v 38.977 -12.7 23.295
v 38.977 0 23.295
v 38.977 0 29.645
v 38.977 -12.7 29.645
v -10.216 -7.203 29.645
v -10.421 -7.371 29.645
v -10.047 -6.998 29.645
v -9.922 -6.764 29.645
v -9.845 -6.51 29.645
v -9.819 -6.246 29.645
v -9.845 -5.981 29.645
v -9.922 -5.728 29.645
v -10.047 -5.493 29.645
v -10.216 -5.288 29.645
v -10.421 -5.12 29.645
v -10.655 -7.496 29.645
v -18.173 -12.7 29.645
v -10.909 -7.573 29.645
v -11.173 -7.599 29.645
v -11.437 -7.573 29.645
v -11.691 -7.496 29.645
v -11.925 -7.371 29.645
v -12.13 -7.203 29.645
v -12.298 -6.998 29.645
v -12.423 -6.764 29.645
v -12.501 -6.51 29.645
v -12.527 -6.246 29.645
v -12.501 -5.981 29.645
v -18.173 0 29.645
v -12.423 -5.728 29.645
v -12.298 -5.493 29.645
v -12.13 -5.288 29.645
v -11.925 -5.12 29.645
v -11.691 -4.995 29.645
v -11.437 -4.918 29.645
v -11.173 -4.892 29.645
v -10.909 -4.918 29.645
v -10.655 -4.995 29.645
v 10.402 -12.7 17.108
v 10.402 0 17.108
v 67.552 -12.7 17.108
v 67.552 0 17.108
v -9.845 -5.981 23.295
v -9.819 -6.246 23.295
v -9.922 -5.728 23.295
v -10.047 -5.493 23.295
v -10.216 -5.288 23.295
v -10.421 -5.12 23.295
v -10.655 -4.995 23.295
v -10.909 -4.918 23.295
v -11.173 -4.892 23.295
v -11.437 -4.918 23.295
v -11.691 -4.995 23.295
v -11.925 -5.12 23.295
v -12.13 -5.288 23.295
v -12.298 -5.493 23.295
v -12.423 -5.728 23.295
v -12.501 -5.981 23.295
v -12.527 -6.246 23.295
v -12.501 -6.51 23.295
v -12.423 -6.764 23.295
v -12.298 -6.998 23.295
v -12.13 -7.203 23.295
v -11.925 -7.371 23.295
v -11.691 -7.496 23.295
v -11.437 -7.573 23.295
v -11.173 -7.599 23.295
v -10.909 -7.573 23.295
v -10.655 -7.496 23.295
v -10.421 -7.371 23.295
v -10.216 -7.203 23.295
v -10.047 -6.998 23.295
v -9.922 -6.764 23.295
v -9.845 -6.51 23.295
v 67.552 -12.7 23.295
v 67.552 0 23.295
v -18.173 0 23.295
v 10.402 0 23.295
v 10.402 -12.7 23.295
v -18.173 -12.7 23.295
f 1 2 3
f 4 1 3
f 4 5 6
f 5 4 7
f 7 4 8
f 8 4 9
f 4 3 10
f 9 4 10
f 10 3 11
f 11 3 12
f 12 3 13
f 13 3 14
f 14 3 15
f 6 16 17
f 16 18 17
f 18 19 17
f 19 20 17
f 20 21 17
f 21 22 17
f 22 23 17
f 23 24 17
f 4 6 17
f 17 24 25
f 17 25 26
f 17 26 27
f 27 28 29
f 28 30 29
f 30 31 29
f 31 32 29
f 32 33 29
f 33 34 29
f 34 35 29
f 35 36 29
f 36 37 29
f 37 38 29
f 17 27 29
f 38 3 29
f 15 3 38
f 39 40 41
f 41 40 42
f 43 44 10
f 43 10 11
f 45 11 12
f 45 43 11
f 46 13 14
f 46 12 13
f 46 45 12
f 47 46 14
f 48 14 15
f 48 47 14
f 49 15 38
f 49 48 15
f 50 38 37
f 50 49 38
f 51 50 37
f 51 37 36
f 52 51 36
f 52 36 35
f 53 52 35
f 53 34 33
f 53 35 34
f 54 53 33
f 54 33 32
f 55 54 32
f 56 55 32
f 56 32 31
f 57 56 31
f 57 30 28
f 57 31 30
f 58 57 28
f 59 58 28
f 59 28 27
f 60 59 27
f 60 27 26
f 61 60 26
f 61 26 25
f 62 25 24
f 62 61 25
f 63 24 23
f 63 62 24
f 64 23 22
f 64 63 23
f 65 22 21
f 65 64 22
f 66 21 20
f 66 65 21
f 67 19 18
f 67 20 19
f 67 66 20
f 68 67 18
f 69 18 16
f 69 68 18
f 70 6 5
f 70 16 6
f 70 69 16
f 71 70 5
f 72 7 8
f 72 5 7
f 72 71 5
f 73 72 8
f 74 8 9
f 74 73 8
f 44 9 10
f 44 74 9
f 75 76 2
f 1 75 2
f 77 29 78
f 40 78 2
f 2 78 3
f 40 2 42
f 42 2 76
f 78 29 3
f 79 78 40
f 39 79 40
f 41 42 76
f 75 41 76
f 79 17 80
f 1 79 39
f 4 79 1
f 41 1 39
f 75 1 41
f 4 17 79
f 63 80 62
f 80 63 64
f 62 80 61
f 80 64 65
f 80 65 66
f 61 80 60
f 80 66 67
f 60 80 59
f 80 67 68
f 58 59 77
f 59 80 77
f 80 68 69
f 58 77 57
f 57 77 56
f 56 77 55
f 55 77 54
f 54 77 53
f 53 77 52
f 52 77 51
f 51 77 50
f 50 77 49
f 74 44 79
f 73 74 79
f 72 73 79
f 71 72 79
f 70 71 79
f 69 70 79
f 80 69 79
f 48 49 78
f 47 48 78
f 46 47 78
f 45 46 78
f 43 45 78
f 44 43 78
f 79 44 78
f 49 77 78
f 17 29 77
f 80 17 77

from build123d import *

# Parameters (mm, degrees)
F1_DEPTH = 12.7
F2_R     = 1.353731
F3_DEPTH = 50.8


with BuildPart() as f1:
    # F0 (on Front) → F1 (new body)
    with BuildSketch(Plane.XZ):
        Polygon((38.97683, 29.645005), (-18.17317, 29.645005), (-18.17317, 23.295005), (10.40183, 23.295005), (38.97683, 23.295005), align=None)
        Polygon((67.55183, 23.295005), (38.97683, 23.295005), (10.40183, 23.295005), (10.40183, 17.107827), (67.55183, 17.107827), align=None)
    extrude(amount=F1_DEPTH)

    # F2 (on Top) → F3 (cut)
    with BuildSketch(Plane.XY):
        with Locations((-11.172788, -6.245584)):
            Circle(F2_R)
    extrude(amount=F3_DEPTH, mode=Mode.SUBTRACT)


solid = f1.part
